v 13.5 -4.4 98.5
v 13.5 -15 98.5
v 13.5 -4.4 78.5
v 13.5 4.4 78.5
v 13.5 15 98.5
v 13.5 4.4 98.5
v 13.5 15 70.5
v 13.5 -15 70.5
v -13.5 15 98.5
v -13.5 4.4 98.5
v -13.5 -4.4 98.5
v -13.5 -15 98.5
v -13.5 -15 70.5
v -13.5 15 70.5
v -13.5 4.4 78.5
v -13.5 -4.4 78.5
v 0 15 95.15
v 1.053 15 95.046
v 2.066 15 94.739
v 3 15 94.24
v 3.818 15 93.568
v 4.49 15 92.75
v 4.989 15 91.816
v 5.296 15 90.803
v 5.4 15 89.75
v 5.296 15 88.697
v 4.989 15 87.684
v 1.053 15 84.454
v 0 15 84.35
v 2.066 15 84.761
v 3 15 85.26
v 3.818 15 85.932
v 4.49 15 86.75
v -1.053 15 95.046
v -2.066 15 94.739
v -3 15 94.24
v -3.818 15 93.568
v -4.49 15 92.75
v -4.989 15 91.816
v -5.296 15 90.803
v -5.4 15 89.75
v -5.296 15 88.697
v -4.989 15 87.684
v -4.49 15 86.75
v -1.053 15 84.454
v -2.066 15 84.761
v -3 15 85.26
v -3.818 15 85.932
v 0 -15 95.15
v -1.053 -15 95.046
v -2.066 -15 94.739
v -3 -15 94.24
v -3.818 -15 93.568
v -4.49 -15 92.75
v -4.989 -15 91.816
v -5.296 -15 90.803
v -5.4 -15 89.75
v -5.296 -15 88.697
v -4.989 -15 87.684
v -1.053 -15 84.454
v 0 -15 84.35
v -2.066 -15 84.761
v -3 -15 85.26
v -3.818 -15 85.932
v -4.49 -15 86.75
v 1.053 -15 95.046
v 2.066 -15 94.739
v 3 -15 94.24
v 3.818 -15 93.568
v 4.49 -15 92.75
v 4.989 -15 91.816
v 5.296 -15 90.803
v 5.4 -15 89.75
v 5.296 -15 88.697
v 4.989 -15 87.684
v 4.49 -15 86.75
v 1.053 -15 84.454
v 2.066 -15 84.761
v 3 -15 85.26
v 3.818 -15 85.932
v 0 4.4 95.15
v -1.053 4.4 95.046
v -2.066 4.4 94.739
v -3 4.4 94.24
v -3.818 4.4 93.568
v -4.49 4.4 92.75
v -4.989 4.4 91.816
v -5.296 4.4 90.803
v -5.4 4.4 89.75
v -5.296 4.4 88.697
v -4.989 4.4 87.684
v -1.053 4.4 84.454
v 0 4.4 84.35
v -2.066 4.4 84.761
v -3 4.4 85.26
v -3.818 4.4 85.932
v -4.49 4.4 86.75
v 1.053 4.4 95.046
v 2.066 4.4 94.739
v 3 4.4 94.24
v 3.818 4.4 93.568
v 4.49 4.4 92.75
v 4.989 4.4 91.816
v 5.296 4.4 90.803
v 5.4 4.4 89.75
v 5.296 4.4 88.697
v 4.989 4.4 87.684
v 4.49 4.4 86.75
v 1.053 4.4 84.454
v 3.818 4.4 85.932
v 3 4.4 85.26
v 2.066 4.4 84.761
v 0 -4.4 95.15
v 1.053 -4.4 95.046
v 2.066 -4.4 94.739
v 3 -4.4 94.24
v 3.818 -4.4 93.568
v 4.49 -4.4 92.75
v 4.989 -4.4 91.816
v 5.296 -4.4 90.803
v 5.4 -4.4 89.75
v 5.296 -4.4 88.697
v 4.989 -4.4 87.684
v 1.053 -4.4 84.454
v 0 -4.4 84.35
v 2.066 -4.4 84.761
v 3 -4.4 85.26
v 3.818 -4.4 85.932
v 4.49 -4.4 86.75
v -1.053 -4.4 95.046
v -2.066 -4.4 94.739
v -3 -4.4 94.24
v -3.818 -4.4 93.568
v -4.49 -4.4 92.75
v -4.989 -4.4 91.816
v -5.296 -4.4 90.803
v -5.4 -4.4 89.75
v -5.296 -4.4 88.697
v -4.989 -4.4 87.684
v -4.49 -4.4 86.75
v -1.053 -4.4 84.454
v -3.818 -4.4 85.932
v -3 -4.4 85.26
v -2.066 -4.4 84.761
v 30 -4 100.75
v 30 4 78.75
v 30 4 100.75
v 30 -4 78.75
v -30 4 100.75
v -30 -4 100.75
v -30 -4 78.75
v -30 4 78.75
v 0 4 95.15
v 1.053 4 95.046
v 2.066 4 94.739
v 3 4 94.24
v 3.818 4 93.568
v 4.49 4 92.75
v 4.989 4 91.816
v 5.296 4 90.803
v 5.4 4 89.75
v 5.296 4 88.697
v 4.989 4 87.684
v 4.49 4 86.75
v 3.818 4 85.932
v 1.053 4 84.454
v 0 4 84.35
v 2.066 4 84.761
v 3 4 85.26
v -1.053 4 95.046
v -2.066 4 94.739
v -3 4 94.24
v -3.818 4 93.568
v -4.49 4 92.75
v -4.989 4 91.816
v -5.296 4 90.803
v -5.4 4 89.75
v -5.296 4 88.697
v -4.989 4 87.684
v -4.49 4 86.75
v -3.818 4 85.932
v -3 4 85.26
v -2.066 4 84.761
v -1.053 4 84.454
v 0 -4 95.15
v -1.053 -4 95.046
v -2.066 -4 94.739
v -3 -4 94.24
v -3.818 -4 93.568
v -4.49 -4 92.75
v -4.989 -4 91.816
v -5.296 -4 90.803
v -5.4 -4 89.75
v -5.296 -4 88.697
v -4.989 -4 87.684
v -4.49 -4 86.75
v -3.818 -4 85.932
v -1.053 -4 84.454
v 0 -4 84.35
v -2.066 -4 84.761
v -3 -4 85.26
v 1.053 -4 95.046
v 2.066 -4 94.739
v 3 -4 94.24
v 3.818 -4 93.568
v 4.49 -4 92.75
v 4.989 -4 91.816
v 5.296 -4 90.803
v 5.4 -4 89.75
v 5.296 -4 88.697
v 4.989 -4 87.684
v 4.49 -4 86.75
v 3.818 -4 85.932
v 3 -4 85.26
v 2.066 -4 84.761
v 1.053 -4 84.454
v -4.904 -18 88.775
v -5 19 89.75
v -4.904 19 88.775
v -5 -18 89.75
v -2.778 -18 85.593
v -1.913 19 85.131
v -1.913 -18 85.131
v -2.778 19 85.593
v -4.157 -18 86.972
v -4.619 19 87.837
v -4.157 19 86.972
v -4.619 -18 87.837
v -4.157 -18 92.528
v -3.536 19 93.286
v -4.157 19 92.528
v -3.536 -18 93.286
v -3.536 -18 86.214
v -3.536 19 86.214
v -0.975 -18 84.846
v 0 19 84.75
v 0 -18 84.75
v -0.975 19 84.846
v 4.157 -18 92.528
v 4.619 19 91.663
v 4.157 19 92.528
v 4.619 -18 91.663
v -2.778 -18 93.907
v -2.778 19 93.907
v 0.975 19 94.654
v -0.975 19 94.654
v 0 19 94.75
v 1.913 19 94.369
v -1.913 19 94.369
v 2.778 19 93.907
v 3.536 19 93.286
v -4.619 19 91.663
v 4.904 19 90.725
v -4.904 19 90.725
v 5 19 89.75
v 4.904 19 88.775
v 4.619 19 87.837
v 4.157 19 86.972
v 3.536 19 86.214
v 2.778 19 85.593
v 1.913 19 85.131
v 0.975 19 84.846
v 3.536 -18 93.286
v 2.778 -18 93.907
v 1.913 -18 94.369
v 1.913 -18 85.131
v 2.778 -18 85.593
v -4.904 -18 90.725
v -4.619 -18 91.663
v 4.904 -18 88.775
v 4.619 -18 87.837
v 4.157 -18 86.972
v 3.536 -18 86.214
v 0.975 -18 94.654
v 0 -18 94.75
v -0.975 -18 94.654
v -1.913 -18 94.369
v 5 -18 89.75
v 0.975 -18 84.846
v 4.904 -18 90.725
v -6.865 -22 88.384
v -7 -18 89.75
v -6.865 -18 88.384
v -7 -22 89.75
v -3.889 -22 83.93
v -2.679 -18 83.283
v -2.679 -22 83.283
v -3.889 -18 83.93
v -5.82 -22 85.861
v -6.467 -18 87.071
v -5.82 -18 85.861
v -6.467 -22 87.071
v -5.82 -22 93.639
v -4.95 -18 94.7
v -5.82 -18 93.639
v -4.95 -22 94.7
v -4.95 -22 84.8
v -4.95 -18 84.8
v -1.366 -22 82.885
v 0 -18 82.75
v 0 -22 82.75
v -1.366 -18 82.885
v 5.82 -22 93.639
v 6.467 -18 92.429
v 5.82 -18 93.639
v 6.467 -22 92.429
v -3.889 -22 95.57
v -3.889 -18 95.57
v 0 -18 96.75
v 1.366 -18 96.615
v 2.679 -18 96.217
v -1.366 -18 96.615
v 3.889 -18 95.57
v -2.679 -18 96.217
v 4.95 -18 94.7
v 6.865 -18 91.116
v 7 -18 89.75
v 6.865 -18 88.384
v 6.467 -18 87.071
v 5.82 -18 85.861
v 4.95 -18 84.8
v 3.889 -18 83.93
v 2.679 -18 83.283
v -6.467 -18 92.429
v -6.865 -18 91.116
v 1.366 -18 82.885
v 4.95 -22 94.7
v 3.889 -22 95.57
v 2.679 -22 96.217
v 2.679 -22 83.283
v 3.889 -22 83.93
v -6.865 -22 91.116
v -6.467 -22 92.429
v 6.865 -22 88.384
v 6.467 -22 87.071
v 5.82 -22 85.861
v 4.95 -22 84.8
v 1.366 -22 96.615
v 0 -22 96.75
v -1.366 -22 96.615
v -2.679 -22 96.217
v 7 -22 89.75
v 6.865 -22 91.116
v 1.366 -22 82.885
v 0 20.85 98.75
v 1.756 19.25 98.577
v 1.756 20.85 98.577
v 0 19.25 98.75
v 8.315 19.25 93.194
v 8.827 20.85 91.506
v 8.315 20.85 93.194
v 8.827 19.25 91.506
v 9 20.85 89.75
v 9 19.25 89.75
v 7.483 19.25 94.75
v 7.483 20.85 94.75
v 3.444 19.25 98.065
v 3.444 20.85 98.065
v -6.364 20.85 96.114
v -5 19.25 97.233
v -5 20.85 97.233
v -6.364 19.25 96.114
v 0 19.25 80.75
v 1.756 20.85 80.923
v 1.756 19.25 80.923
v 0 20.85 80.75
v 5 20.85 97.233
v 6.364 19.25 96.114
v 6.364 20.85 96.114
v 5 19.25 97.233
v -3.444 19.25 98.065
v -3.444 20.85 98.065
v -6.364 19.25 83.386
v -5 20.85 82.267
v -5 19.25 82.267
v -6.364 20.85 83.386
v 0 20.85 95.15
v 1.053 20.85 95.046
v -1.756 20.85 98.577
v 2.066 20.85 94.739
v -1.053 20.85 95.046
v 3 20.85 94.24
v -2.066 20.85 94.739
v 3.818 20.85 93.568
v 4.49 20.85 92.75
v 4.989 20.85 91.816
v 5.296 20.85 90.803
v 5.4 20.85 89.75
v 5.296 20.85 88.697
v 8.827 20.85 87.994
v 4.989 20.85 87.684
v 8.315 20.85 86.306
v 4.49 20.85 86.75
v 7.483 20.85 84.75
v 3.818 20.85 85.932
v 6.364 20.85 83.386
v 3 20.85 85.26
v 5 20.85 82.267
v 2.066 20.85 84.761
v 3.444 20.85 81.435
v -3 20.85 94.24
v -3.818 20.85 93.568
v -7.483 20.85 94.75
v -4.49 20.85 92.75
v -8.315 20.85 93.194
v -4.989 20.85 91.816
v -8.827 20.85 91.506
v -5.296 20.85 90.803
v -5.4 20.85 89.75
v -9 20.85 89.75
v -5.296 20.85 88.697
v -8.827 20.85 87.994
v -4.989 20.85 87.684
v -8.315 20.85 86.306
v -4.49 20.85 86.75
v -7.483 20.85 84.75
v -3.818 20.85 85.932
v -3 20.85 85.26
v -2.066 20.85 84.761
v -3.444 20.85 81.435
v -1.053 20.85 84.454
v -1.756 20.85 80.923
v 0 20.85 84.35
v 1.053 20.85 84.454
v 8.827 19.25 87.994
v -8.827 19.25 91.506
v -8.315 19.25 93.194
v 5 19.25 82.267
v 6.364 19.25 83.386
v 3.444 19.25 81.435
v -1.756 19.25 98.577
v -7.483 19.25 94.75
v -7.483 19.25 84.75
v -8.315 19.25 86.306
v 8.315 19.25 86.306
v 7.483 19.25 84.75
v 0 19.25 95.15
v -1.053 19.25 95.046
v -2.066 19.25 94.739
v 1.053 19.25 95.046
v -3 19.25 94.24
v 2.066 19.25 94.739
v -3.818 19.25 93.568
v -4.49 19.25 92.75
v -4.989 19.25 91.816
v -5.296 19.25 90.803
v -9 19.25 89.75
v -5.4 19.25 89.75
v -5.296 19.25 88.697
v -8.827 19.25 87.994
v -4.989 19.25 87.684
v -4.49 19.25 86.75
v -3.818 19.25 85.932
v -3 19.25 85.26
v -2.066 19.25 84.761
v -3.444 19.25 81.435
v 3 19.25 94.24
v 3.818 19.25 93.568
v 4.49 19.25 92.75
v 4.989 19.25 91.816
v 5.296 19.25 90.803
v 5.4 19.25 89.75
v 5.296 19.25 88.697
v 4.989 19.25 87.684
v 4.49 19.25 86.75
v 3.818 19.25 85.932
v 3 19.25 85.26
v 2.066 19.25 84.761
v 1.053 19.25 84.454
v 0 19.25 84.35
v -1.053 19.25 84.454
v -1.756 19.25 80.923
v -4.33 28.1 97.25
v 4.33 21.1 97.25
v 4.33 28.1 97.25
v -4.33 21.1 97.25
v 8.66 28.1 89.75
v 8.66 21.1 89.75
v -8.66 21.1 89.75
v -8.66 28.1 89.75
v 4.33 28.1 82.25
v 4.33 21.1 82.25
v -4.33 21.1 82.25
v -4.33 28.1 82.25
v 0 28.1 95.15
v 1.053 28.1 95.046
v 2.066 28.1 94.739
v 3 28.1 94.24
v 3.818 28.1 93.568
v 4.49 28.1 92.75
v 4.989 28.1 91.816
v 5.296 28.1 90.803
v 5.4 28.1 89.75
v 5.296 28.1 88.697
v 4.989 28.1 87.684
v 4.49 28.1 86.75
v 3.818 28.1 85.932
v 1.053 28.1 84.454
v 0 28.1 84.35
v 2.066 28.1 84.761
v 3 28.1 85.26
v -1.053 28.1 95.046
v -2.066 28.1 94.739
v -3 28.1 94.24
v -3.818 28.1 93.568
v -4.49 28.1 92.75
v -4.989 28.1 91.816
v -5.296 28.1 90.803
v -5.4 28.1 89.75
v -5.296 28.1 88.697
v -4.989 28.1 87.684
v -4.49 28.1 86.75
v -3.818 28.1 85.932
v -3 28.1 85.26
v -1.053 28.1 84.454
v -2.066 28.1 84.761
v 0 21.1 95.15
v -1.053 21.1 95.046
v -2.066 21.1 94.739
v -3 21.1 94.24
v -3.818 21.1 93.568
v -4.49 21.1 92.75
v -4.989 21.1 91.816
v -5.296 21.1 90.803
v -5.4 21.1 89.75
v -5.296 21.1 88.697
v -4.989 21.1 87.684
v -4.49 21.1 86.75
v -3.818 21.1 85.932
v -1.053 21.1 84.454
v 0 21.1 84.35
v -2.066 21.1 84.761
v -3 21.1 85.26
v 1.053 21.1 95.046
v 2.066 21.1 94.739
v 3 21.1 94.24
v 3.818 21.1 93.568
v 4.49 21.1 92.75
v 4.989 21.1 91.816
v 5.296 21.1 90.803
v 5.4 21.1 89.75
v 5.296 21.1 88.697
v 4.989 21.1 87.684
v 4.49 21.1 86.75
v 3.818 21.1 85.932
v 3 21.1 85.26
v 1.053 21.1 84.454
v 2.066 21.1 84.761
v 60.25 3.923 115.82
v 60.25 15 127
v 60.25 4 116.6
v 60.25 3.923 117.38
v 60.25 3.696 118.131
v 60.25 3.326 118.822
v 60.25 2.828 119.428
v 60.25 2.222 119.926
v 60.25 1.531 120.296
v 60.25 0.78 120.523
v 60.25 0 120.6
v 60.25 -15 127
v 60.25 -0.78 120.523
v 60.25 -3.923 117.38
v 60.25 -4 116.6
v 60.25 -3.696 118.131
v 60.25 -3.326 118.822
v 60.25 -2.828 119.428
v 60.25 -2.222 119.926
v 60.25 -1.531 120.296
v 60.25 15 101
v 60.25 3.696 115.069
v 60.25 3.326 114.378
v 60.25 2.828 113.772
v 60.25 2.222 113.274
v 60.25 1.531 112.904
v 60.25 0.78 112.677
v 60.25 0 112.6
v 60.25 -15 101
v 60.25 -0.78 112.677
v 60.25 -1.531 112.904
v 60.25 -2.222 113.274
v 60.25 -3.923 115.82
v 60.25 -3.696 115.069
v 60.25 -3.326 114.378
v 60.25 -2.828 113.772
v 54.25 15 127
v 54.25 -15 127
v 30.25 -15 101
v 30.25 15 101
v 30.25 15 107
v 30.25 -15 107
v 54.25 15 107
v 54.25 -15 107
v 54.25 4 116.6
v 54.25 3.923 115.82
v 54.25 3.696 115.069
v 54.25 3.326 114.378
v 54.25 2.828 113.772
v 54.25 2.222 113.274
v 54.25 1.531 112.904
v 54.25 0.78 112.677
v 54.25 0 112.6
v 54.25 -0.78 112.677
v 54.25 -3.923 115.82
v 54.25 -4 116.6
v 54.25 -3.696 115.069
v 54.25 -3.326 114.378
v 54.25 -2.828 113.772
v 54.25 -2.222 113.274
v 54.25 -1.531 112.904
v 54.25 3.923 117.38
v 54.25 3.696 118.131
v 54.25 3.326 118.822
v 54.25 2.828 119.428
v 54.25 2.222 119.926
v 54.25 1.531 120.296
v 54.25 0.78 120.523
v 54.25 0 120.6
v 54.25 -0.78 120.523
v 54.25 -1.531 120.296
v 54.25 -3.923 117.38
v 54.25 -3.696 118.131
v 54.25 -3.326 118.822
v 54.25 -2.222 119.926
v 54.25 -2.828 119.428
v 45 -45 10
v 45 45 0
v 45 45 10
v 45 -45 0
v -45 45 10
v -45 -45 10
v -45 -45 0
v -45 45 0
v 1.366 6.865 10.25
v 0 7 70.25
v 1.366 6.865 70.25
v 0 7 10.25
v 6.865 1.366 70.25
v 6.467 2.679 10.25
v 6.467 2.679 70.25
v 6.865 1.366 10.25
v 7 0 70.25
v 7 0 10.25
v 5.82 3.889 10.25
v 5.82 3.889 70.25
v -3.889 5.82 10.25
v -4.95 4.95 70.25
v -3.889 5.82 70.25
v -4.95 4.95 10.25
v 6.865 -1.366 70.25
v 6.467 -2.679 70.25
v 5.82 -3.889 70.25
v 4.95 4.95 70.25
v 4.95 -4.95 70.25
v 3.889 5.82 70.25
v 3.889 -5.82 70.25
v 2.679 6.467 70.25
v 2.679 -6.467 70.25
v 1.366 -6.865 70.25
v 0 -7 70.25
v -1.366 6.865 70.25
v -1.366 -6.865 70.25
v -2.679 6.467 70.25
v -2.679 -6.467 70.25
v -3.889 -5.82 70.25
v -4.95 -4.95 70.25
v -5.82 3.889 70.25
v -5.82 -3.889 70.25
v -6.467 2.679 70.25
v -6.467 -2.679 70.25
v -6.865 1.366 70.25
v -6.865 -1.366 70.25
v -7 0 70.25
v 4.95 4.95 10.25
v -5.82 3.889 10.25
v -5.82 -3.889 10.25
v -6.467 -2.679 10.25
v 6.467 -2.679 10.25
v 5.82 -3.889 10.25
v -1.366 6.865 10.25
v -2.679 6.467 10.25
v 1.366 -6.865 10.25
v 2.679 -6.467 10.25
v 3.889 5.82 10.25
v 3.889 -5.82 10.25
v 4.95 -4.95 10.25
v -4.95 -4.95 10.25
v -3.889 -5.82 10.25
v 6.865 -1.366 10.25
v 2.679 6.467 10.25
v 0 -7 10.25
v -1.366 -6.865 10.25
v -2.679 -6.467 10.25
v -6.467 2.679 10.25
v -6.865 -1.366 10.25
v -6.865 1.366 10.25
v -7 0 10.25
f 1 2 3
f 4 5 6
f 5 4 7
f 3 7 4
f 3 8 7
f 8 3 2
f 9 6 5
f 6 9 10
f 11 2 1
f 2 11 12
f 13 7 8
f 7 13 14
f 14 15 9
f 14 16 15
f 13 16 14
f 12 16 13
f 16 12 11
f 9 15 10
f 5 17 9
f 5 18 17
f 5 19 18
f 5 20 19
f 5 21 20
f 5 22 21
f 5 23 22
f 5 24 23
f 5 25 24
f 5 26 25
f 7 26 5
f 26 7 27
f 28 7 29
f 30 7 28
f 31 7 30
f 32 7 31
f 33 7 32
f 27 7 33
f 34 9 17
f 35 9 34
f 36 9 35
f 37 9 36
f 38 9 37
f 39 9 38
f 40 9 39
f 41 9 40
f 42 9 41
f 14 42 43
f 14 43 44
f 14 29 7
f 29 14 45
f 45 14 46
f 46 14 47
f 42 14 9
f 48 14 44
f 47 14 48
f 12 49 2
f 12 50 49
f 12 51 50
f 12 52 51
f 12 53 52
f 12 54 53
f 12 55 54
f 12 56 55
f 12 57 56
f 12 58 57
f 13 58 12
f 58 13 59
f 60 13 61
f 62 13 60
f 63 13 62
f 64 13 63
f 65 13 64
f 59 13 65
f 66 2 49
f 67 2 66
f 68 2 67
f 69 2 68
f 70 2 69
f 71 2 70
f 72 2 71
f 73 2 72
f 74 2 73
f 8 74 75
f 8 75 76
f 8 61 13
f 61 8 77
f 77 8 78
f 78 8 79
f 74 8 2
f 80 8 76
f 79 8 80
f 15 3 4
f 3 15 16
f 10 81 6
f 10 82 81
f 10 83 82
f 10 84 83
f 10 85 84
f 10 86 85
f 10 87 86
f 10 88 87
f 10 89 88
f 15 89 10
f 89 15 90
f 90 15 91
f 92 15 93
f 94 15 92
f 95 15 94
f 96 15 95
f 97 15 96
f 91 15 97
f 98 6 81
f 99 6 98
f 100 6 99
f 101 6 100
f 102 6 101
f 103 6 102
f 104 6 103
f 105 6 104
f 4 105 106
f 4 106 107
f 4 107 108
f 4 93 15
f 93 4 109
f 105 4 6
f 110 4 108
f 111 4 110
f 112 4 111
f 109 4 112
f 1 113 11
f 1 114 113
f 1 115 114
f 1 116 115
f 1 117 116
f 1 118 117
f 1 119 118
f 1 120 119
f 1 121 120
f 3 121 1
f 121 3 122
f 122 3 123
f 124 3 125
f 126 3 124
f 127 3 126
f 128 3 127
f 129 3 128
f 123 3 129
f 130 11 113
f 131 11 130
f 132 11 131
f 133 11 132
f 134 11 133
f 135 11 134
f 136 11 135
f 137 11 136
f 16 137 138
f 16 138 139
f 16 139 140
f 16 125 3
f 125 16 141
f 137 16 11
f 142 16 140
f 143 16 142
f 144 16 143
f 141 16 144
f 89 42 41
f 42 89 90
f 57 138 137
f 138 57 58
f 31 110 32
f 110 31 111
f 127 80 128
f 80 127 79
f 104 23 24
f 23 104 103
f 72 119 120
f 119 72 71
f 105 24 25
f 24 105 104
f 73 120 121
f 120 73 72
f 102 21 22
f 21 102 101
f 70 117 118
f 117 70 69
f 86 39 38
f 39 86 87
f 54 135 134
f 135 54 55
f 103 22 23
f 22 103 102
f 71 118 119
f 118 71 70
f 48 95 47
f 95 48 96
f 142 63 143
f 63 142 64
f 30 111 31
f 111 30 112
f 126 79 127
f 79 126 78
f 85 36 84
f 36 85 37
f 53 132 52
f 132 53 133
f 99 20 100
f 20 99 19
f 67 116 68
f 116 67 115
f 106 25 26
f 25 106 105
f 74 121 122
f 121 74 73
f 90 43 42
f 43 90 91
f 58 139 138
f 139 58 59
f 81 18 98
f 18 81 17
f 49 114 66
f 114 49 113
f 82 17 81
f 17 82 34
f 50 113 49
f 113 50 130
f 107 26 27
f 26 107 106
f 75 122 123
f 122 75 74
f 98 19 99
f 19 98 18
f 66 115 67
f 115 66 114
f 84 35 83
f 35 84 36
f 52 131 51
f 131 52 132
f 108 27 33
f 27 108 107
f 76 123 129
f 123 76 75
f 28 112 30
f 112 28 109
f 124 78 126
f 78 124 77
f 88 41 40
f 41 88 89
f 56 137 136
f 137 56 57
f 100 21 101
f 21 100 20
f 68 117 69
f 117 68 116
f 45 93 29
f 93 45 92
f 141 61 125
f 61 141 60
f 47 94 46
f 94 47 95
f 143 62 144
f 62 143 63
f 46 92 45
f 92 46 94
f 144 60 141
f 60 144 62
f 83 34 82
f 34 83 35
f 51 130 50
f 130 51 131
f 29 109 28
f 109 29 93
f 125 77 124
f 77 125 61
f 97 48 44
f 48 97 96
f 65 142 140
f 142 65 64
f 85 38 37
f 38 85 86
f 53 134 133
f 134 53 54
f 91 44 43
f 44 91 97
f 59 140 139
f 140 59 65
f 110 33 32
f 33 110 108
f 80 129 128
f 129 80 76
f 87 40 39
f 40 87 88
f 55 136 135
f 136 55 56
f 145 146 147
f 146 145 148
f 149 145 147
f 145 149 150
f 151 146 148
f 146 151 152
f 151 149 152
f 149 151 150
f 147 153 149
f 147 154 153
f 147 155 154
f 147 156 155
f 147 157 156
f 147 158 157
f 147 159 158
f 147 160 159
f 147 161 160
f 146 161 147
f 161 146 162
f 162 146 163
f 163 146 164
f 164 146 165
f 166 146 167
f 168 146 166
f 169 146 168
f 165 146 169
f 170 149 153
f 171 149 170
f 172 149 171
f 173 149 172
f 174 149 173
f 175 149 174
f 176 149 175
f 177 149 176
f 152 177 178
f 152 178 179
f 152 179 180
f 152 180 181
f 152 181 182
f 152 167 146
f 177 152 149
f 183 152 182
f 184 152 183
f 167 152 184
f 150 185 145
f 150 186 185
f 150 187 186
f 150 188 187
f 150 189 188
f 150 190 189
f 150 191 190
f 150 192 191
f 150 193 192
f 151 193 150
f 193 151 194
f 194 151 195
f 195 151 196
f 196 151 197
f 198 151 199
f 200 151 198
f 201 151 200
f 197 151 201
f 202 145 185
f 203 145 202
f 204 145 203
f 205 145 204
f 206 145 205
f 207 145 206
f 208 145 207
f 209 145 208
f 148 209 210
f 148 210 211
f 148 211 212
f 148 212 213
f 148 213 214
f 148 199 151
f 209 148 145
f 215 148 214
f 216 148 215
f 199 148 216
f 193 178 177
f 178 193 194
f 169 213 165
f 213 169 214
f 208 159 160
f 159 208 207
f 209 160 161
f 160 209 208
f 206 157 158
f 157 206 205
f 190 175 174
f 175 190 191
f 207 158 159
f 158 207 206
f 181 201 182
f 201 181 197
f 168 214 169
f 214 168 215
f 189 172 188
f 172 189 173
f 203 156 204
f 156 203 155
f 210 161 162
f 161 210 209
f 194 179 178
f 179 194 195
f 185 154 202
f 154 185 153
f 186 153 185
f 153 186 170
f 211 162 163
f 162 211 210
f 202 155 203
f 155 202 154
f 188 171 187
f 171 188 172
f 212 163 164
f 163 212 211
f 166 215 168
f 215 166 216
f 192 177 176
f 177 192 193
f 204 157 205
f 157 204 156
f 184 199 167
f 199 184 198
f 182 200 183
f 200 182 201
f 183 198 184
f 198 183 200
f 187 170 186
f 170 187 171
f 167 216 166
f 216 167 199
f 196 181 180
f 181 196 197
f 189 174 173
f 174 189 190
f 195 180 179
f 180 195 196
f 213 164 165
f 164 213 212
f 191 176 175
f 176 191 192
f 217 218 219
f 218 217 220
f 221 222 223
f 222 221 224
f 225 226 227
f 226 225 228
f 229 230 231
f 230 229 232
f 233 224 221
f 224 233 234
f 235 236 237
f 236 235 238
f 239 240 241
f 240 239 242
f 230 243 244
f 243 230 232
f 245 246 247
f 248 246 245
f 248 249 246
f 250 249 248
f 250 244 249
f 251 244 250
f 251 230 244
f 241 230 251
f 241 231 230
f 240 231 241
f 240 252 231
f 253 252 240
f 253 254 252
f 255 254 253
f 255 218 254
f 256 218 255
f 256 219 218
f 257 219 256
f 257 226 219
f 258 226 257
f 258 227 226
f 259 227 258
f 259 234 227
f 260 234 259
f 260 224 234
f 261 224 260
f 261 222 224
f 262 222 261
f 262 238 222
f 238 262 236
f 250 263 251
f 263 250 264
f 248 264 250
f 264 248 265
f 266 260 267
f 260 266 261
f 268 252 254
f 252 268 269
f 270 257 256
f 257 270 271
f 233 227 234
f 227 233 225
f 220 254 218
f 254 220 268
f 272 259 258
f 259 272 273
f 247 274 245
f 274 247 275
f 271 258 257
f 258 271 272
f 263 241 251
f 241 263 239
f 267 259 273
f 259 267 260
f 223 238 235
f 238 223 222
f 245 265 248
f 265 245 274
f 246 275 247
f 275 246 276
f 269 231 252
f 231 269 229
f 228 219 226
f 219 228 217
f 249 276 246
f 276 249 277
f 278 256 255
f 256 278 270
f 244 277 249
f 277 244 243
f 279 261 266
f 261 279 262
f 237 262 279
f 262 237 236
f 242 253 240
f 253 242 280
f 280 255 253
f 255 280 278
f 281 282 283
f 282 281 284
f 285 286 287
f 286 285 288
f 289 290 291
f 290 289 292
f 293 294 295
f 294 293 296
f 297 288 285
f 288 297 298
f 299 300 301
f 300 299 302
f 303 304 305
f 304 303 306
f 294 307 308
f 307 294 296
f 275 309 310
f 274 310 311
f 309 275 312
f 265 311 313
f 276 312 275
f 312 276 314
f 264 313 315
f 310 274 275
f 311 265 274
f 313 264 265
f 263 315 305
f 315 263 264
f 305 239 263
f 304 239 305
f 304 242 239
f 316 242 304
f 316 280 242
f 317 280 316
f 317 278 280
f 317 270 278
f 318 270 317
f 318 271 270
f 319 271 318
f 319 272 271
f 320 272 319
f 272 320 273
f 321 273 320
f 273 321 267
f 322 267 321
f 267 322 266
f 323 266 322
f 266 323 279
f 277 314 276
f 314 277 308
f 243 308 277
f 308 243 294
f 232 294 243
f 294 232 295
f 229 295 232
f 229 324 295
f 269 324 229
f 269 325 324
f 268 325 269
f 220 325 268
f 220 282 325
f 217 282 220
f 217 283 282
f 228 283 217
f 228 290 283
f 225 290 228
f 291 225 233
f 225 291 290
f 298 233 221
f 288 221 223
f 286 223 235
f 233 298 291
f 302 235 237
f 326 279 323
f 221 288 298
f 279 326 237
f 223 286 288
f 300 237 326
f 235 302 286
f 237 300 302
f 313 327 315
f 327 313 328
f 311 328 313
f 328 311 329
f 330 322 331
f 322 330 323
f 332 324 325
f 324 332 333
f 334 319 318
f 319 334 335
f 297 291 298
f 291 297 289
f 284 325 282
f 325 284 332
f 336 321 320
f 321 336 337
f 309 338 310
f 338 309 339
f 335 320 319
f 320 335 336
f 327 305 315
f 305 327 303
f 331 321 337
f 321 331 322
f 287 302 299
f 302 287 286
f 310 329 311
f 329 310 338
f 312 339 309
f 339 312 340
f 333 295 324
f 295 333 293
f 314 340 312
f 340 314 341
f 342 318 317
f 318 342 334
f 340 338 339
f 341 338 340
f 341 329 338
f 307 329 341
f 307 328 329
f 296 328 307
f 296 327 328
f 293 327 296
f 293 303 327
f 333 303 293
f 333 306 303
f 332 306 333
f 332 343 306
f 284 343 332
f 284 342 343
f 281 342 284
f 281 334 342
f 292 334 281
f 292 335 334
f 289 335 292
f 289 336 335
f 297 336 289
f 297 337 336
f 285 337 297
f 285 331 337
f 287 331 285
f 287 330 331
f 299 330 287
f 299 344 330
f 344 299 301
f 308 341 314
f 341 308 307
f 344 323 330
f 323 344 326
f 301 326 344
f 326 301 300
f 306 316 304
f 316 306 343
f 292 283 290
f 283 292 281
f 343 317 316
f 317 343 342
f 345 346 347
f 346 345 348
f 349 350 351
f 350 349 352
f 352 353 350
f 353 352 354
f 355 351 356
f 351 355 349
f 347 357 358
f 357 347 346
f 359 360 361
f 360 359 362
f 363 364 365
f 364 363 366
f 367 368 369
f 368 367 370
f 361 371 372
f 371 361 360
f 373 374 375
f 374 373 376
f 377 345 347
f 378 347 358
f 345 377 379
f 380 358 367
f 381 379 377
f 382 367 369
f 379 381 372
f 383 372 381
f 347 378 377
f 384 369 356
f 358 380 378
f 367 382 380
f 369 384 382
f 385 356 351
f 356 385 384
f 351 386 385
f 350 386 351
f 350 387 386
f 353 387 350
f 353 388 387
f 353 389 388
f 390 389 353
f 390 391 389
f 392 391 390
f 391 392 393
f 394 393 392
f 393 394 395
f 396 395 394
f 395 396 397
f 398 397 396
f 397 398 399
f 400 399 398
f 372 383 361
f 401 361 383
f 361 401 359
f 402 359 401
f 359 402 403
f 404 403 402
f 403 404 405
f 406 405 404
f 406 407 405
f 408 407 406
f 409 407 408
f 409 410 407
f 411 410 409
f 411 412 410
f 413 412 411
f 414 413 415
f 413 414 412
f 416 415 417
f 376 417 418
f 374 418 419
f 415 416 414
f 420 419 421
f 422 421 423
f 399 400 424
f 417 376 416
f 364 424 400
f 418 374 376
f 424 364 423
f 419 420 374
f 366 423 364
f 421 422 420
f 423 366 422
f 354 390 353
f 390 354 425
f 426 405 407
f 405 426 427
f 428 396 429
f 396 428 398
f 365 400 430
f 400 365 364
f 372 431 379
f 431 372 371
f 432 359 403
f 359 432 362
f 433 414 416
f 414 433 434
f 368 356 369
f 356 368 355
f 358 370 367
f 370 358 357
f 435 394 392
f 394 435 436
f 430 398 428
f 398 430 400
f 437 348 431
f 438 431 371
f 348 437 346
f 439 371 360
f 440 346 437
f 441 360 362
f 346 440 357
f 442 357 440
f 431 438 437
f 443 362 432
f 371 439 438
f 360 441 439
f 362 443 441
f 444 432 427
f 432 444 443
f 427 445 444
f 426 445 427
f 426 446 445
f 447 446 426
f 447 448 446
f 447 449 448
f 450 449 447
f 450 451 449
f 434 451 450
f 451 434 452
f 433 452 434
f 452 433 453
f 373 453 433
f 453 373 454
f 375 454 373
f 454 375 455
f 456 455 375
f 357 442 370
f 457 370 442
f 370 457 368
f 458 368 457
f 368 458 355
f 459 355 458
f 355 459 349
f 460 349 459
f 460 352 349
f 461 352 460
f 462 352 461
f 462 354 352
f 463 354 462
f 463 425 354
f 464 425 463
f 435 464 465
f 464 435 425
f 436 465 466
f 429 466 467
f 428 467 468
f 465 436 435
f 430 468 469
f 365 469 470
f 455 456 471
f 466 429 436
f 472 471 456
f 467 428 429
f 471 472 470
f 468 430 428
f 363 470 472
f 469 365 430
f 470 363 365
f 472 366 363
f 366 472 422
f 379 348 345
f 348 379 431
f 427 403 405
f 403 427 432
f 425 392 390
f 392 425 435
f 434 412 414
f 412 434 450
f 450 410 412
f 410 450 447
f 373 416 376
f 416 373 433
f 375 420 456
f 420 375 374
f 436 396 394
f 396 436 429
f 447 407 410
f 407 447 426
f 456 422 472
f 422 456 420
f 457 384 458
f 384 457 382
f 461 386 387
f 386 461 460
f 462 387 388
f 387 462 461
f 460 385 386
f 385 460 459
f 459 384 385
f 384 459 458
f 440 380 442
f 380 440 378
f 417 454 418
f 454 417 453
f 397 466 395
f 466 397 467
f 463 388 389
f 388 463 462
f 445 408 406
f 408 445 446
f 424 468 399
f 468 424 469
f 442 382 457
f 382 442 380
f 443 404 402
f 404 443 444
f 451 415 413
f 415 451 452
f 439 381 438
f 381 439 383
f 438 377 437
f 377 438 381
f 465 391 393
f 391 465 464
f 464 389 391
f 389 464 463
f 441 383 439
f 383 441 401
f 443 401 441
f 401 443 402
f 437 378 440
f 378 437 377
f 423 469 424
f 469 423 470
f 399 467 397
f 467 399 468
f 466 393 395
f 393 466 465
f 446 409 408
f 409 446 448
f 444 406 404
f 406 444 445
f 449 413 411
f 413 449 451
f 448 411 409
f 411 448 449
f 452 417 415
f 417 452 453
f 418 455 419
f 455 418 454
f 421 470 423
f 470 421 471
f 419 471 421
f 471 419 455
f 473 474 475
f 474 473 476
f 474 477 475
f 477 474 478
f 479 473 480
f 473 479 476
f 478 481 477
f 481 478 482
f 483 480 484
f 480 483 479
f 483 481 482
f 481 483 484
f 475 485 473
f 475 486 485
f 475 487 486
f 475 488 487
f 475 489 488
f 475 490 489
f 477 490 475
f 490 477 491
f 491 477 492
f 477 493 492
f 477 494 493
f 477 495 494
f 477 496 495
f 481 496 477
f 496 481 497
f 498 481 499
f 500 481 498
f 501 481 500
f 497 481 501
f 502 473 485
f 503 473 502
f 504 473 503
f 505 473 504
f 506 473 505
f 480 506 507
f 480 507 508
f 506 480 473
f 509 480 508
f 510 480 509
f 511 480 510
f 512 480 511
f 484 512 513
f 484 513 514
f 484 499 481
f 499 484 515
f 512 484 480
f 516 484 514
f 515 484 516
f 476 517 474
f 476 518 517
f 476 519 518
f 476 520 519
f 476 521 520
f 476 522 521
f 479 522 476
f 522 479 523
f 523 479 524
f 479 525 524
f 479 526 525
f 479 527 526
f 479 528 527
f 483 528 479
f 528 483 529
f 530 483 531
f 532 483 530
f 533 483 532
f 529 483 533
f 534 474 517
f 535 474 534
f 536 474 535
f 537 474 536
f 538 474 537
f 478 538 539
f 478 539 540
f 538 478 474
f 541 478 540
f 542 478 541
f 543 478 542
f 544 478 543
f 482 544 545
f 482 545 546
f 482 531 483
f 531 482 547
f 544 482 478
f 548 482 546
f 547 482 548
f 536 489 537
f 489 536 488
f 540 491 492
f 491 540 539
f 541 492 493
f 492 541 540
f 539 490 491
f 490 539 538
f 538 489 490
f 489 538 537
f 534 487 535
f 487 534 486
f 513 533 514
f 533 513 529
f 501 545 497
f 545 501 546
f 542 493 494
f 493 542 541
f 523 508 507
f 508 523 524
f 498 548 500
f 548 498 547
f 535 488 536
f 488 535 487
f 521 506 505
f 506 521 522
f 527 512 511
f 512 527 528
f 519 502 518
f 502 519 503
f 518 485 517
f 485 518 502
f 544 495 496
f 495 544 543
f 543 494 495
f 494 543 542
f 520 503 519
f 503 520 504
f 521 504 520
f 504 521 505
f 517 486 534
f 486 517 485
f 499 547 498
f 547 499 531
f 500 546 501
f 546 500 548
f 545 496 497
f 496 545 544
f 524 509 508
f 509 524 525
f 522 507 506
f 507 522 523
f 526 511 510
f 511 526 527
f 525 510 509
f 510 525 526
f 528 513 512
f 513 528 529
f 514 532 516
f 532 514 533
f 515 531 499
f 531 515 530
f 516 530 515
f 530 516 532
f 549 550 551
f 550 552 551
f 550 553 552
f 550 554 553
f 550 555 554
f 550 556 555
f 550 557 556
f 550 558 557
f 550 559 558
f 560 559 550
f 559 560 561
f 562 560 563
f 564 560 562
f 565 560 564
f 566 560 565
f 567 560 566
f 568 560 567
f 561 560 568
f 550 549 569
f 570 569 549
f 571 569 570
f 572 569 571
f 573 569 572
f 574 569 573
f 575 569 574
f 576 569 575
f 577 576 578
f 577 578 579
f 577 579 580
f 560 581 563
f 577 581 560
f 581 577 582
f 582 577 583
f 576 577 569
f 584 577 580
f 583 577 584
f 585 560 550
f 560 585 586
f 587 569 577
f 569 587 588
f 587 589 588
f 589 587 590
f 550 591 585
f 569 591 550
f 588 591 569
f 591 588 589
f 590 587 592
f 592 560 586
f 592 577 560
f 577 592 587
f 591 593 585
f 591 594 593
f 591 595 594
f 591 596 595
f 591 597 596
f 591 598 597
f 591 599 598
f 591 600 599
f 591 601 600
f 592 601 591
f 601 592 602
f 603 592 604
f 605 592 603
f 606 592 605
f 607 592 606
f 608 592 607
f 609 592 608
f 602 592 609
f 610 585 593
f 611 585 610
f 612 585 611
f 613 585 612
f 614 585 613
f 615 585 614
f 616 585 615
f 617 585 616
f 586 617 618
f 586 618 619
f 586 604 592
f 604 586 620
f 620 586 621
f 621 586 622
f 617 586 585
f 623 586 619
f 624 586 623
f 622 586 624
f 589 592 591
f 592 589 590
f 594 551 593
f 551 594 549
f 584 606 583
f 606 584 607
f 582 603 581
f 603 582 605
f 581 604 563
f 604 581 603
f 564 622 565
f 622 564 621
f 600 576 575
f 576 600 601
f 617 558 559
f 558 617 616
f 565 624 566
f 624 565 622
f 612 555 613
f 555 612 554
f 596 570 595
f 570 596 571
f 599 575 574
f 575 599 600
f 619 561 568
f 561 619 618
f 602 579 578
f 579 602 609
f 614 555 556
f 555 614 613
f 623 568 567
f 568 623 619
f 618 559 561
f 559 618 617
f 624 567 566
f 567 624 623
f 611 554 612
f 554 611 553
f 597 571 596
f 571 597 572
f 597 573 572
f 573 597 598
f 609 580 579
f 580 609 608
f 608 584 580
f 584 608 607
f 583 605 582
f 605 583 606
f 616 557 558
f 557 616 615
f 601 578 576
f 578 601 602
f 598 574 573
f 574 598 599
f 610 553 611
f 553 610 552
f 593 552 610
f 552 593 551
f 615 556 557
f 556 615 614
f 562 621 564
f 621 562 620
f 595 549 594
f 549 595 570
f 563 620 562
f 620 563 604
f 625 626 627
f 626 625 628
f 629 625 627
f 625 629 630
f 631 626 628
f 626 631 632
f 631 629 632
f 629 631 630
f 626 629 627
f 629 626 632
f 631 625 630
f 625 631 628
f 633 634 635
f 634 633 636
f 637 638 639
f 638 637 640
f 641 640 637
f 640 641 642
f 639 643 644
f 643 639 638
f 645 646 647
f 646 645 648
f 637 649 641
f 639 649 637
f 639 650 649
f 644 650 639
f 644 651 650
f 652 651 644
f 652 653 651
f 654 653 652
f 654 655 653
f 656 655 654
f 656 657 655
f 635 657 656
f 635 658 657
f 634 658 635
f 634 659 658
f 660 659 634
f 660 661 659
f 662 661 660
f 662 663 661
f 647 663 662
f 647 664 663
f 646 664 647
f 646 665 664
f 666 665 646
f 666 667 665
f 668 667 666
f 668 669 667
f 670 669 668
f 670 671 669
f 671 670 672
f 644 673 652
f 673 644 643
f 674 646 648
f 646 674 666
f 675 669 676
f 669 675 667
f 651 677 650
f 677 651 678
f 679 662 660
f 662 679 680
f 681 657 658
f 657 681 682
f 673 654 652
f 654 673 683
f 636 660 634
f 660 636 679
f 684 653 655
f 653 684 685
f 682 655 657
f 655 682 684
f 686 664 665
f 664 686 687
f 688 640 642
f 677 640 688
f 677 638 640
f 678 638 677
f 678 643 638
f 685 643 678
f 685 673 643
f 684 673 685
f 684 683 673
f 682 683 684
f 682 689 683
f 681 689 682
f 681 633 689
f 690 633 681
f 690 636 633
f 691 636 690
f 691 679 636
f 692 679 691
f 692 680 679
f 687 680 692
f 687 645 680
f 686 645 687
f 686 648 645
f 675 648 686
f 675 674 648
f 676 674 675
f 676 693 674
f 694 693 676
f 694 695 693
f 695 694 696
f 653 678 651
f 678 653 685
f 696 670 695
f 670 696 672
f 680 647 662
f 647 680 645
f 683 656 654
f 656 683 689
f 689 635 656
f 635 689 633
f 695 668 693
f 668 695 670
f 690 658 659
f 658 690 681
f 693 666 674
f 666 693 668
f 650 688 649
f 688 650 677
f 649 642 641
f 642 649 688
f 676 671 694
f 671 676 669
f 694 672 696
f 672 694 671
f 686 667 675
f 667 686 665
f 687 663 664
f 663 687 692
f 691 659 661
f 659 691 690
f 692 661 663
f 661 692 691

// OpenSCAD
$fn = 32;

// ------------------------------------------------------------------------
// Lamp arm: column d14 x 60 mm, arm 60 mm
// Every part is its own module, assembly() places every instance.
// ------------------------------------------------------------------------

// --- part 1 ---
module lamp_base() {
  difference() {
    translate([-45, -45, 0]) cube([90, 90, 10]);
  }
}

// --- part 2 ---
module lamp_column() {
  cylinder(h = 60, d = 14);
}

// --- part 3 ---
module head_fork() {
  difference() {
    translate([-13.5, -15, 0]) cube([27, 30, 28]);
    translate([-14.5, -4.4, 8]) cube([29, 8.8, 21]);
    translate([0, 0, 19.25]) rotate([90, 0, 0]) cylinder(h = 32, d = 10.8, center = true);
  }
}

// --- part 4 ---
module lamp_arm() {
  difference() {
    translate([-30, -4, 0]) cube([60, 8, 22]);
    translate([0, 0, 11]) rotate([90, 0, 0]) cylinder(h = 10, d = 10.8, center = true);
  }
}

// --- part 5 ---
module arm_pin() {
  rotate([0, 90, 0]) cylinder(h = 38, d = 10, center = true);
  translate([-22, 0, 0]) rotate([0, 90, 0]) cylinder(h = 4, d = 14);
}

// --- part 6 ---
module arm_washer() {
  difference() {
      translate([0, 0, 0]) cylinder(h = 1.6, d = 18);
      translate([0, 0, -1]) cylinder(h = 3.6, d = 10.8);
    }
}

// --- part 7 ---
module arm_nut() {
  difference() {
    linear_extrude(height = 7) polygon(points = [[8.66, 0], [4.33, 7.5], [-4.33, 7.5], [-8.66, 0], [-4.33, -7.5], [4.33, -7.5]]);
    translate([0, 0, -1]) cylinder(h = 9, d = 10.8);
  }
}

// --- part 8 ---
module shade_bracket() {
  difference() {
    translate([-15, -15, 0]) cube([30, 30, 26]);
    translate([-16, -16, 6]) cube([25, 32, 21]);
    translate([12, 0, 15.6]) rotate([0, 90, 0]) cylinder(h = 8, d = 8, center = true);
  }
}

// --- assembly ---
module assembly() {
  color([0.80, 0.24, 0.20]) translate([0, 0, 0]) rotate([0, 0, 0]) lamp_base();
  color([0.20, 0.45, 0.75]) translate([0, 0, 10.25]) rotate([0, 0, 0]) lamp_column();
  color([0.25, 0.62, 0.32]) translate([0, 0, 70.5]) rotate([0, 0, 0]) head_fork();
  color([0.92, 0.70, 0.18]) translate([0, 0, 78.75]) rotate([0, 0, 0]) lamp_arm();
  color([0.58, 0.35, 0.70]) translate([0, 0, 89.75]) rotate([0, 0, 90]) arm_pin();
  color([0.16, 0.66, 0.66]) translate([0, 20.85, 89.75]) rotate([90, 0, 0]) arm_washer();
  color([0.85, 0.48, 0.18]) translate([0, 28.1, 89.75]) rotate([90, 0, 0]) arm_nut();
  color([0.55, 0.60, 0.65]) translate([45.25, 0, 101]) rotate([0, 0, 0]) shade_bracket();
}

assembly();
